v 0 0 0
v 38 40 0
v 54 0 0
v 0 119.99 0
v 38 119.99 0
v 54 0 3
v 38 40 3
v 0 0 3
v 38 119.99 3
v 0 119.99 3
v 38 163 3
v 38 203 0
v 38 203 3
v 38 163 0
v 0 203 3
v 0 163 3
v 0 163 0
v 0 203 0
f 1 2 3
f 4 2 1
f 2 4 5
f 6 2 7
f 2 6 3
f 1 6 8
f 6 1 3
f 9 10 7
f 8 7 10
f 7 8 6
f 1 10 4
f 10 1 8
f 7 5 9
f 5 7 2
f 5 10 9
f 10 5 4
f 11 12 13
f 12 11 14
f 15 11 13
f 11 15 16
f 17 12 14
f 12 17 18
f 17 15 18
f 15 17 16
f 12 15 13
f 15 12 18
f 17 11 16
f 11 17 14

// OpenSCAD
// Settings
$fn = $preview ? 24 : 180;


// variables
margin              =   0.01;
bottom_thickness    =  3;
part_h              =  3; //38;

E_dx                =  33;
E_dy                =  40+40+33; //partD1+partd2+gap

Angle               =  37;

screw_hole_h        =  20;
screw_hole_d        =   2.5;

wall_thickness      =   4;
round_edge_r        =   5;
    
    
// Modules    
module M3InsertHole(Insert_D=4, Insert_H=6.7)
{
    // Centre x & y , and zero z 
    translate([0,0,Insert_H/2]) 
    cylinder(h=Insert_H, d=Insert_D,center = true);
}
    


// Shapes
//
//    15,5 ----- 4,13         /| 1,10
// 16,7   /     \____________/ |
//   +---/       3,12     2,11 |
//   |   6,14                  |
//   |                         |
//   |                         |
//   +-------------------------+
// 17,8                        0,9
//


ShapePoints = [
    // Top
    [  0,  0,  0 ],  //  0
    [  0,  0,  0 ],  //  1
    [ 28, 40,  0 ],  //  2
    [ 28, 55,  0 ],  //  3
    [  0, 55,  0 ],  //  4
    [  0,  0,  0 ],  //  5
    [ 10,  0,  0 ],  //  6
    [ 28, 40,  0 ],  //  7
    [ 28, 55,  0 ],  //  8
    
    // Bottom
    [  0,  0,  0 ],  //  9
    [  0,  0,  0 ],  // 10
    [ 28, 40,  0 ],  // 11
    [ 28, 55,  0 ],  // 12
    [  0, 55,  0 ],  // 13
    [  0,  0,  0 ],  // 14
    [ 10,  0,  0 ],  // 15
    [ 28, 40,  0 ],  // 16
    [ 28, 55,  0 ],  // 17




]; 
  
ShapeFaces = [
  [0,1,2,3,4],  // bottom
  [6,5,1,0],  // front
  [1,2,7,6],  // s
  [2,3,8,7],  // right
  [3,4,9,8],  // back
  [4,0,5,9],
  [9,8,7,6,5]
]; 

difference(){
    
    union(){
        
        CubePoints1 = [
          [  0,  0,  0 ],  //0
          [ 54,  0,  0 ],  //1
          [ 38, 40,  0 ],  //2
          [  0, 40,  0 ],  //3
          [  0,  0, part_h ],  //4
          [ 54,  0, part_h ],  //5
          [ 38, 40, part_h ],  //6
          [  0, 40, part_h ]]; //7
          
        CubeFaces1 = [
          [0,1,2,3],  // bottom
          [4,5,1,0],  // front
          [7,6,5,4],  // top
          [5,6,2,1],  // right
          [6,7,3,2],  // back
          [7,4,0,3]]; // left
          
        polyhedron( CubePoints1, CubeFaces1 );
        
        
        CubePoints2 = [
          [  0,  0,  0 ],  //0
          [ 38,  0,  0 ],  //1
          [ 38, 40,  0 ],  //2
          [  0, 40,  0 ],  //3
          [  0,  0, part_h ],  //4
          [ 38,  0, part_h ],  //5
          [ 38, 40, part_h ],  //6
          [  0, 40, part_h ]]; //7
          
        CubeFaces2 = [
          [0,1,2,3],  // bottom
          [4,5,1,0],  // front
          [7,6,5,4],  // top
          [5,6,2,1],  // right
          [6,7,3,2],  // back
          [7,4,0,3]]; // left
          
        translate([0,40-margin,0])polyhedron( CubePoints2, CubeFaces2 );
                
        
        
        
        translate([0,40+40-margin,0])cube([38,40,part_h]);
        
         
        CubePoints3 = [
          [  0,  0,  0 ],  //0
          [ 10+E_dx,  0,  0 ],  //1
          [ 28+E_dx, 40,  0 ],  //2
                    [28,55,0], //3
          [  0, 55,  0 ],  //4
          
          [  0,  0, part_h ],  //5
          [ 10+E_dx,  0, part_h ],  //6
          [ 28+E_dx, 40, part_h ],  //7
                     [28,55,part_h], //8 
                     [  0, 55, part_h ],//9
          

                
          ]; 
          
        CubeFaces3 = [
          [0,1,2,3,4],  // bottom
          [6,5,1,0],  // front
          [1,2,7,6],  // s
          [2,3,8,7],  // right
          [3,4,9,8],  // back
          [4,0,5,9],
          [9,8,7,6,5]]; // left
          
        translate([0,E_dy-margin,0])polyhedron( CubePoints3, CubeFaces3 );
        
        translate([0,E_dy+55-5,0])cube([5+E_dx,40,part_h]);
        
    }
    translate([0-margin-10,0-margin-10,4])cube([38,60,38]);
    
        // screw holes
//    translate([ 10, 10,0])  cylinder(h=screw_hole_h, d=screw_hole_d, center=true);
//    translate([ 10, 45,0])  cylinder(h=screw_hole_h, d=screw_hole_d, center=true);
//    translate([ 25, 10,0])  cylinder(h=screw_hole_h, d=screw_hole_d, center=true);
//    translate([ 25, 45,0])  cylinder(h=screw_hole_h, d=screw_hole_d, center=true);
    
        //round edge
//    translate([38-5+margin,60-5+20+margin,0])difference(){translate([round_edge_r/2,round_edge_r/2,0])cube([round_edge_r,round_edge_r,100],center=true); cylinder(h=110,r=round_edge_r, center=true);}
    
    
    
//    translate([ 10,55,bottom_thickness-margin-6.5]) M3InsertHole();
//    translate([ 30,55,bottom_thickness-margin-6.5]) M3InsertHole();
//    translate([ 37,10,bottom_thickness-margin-6.5]) M3InsertHole();
   
}
